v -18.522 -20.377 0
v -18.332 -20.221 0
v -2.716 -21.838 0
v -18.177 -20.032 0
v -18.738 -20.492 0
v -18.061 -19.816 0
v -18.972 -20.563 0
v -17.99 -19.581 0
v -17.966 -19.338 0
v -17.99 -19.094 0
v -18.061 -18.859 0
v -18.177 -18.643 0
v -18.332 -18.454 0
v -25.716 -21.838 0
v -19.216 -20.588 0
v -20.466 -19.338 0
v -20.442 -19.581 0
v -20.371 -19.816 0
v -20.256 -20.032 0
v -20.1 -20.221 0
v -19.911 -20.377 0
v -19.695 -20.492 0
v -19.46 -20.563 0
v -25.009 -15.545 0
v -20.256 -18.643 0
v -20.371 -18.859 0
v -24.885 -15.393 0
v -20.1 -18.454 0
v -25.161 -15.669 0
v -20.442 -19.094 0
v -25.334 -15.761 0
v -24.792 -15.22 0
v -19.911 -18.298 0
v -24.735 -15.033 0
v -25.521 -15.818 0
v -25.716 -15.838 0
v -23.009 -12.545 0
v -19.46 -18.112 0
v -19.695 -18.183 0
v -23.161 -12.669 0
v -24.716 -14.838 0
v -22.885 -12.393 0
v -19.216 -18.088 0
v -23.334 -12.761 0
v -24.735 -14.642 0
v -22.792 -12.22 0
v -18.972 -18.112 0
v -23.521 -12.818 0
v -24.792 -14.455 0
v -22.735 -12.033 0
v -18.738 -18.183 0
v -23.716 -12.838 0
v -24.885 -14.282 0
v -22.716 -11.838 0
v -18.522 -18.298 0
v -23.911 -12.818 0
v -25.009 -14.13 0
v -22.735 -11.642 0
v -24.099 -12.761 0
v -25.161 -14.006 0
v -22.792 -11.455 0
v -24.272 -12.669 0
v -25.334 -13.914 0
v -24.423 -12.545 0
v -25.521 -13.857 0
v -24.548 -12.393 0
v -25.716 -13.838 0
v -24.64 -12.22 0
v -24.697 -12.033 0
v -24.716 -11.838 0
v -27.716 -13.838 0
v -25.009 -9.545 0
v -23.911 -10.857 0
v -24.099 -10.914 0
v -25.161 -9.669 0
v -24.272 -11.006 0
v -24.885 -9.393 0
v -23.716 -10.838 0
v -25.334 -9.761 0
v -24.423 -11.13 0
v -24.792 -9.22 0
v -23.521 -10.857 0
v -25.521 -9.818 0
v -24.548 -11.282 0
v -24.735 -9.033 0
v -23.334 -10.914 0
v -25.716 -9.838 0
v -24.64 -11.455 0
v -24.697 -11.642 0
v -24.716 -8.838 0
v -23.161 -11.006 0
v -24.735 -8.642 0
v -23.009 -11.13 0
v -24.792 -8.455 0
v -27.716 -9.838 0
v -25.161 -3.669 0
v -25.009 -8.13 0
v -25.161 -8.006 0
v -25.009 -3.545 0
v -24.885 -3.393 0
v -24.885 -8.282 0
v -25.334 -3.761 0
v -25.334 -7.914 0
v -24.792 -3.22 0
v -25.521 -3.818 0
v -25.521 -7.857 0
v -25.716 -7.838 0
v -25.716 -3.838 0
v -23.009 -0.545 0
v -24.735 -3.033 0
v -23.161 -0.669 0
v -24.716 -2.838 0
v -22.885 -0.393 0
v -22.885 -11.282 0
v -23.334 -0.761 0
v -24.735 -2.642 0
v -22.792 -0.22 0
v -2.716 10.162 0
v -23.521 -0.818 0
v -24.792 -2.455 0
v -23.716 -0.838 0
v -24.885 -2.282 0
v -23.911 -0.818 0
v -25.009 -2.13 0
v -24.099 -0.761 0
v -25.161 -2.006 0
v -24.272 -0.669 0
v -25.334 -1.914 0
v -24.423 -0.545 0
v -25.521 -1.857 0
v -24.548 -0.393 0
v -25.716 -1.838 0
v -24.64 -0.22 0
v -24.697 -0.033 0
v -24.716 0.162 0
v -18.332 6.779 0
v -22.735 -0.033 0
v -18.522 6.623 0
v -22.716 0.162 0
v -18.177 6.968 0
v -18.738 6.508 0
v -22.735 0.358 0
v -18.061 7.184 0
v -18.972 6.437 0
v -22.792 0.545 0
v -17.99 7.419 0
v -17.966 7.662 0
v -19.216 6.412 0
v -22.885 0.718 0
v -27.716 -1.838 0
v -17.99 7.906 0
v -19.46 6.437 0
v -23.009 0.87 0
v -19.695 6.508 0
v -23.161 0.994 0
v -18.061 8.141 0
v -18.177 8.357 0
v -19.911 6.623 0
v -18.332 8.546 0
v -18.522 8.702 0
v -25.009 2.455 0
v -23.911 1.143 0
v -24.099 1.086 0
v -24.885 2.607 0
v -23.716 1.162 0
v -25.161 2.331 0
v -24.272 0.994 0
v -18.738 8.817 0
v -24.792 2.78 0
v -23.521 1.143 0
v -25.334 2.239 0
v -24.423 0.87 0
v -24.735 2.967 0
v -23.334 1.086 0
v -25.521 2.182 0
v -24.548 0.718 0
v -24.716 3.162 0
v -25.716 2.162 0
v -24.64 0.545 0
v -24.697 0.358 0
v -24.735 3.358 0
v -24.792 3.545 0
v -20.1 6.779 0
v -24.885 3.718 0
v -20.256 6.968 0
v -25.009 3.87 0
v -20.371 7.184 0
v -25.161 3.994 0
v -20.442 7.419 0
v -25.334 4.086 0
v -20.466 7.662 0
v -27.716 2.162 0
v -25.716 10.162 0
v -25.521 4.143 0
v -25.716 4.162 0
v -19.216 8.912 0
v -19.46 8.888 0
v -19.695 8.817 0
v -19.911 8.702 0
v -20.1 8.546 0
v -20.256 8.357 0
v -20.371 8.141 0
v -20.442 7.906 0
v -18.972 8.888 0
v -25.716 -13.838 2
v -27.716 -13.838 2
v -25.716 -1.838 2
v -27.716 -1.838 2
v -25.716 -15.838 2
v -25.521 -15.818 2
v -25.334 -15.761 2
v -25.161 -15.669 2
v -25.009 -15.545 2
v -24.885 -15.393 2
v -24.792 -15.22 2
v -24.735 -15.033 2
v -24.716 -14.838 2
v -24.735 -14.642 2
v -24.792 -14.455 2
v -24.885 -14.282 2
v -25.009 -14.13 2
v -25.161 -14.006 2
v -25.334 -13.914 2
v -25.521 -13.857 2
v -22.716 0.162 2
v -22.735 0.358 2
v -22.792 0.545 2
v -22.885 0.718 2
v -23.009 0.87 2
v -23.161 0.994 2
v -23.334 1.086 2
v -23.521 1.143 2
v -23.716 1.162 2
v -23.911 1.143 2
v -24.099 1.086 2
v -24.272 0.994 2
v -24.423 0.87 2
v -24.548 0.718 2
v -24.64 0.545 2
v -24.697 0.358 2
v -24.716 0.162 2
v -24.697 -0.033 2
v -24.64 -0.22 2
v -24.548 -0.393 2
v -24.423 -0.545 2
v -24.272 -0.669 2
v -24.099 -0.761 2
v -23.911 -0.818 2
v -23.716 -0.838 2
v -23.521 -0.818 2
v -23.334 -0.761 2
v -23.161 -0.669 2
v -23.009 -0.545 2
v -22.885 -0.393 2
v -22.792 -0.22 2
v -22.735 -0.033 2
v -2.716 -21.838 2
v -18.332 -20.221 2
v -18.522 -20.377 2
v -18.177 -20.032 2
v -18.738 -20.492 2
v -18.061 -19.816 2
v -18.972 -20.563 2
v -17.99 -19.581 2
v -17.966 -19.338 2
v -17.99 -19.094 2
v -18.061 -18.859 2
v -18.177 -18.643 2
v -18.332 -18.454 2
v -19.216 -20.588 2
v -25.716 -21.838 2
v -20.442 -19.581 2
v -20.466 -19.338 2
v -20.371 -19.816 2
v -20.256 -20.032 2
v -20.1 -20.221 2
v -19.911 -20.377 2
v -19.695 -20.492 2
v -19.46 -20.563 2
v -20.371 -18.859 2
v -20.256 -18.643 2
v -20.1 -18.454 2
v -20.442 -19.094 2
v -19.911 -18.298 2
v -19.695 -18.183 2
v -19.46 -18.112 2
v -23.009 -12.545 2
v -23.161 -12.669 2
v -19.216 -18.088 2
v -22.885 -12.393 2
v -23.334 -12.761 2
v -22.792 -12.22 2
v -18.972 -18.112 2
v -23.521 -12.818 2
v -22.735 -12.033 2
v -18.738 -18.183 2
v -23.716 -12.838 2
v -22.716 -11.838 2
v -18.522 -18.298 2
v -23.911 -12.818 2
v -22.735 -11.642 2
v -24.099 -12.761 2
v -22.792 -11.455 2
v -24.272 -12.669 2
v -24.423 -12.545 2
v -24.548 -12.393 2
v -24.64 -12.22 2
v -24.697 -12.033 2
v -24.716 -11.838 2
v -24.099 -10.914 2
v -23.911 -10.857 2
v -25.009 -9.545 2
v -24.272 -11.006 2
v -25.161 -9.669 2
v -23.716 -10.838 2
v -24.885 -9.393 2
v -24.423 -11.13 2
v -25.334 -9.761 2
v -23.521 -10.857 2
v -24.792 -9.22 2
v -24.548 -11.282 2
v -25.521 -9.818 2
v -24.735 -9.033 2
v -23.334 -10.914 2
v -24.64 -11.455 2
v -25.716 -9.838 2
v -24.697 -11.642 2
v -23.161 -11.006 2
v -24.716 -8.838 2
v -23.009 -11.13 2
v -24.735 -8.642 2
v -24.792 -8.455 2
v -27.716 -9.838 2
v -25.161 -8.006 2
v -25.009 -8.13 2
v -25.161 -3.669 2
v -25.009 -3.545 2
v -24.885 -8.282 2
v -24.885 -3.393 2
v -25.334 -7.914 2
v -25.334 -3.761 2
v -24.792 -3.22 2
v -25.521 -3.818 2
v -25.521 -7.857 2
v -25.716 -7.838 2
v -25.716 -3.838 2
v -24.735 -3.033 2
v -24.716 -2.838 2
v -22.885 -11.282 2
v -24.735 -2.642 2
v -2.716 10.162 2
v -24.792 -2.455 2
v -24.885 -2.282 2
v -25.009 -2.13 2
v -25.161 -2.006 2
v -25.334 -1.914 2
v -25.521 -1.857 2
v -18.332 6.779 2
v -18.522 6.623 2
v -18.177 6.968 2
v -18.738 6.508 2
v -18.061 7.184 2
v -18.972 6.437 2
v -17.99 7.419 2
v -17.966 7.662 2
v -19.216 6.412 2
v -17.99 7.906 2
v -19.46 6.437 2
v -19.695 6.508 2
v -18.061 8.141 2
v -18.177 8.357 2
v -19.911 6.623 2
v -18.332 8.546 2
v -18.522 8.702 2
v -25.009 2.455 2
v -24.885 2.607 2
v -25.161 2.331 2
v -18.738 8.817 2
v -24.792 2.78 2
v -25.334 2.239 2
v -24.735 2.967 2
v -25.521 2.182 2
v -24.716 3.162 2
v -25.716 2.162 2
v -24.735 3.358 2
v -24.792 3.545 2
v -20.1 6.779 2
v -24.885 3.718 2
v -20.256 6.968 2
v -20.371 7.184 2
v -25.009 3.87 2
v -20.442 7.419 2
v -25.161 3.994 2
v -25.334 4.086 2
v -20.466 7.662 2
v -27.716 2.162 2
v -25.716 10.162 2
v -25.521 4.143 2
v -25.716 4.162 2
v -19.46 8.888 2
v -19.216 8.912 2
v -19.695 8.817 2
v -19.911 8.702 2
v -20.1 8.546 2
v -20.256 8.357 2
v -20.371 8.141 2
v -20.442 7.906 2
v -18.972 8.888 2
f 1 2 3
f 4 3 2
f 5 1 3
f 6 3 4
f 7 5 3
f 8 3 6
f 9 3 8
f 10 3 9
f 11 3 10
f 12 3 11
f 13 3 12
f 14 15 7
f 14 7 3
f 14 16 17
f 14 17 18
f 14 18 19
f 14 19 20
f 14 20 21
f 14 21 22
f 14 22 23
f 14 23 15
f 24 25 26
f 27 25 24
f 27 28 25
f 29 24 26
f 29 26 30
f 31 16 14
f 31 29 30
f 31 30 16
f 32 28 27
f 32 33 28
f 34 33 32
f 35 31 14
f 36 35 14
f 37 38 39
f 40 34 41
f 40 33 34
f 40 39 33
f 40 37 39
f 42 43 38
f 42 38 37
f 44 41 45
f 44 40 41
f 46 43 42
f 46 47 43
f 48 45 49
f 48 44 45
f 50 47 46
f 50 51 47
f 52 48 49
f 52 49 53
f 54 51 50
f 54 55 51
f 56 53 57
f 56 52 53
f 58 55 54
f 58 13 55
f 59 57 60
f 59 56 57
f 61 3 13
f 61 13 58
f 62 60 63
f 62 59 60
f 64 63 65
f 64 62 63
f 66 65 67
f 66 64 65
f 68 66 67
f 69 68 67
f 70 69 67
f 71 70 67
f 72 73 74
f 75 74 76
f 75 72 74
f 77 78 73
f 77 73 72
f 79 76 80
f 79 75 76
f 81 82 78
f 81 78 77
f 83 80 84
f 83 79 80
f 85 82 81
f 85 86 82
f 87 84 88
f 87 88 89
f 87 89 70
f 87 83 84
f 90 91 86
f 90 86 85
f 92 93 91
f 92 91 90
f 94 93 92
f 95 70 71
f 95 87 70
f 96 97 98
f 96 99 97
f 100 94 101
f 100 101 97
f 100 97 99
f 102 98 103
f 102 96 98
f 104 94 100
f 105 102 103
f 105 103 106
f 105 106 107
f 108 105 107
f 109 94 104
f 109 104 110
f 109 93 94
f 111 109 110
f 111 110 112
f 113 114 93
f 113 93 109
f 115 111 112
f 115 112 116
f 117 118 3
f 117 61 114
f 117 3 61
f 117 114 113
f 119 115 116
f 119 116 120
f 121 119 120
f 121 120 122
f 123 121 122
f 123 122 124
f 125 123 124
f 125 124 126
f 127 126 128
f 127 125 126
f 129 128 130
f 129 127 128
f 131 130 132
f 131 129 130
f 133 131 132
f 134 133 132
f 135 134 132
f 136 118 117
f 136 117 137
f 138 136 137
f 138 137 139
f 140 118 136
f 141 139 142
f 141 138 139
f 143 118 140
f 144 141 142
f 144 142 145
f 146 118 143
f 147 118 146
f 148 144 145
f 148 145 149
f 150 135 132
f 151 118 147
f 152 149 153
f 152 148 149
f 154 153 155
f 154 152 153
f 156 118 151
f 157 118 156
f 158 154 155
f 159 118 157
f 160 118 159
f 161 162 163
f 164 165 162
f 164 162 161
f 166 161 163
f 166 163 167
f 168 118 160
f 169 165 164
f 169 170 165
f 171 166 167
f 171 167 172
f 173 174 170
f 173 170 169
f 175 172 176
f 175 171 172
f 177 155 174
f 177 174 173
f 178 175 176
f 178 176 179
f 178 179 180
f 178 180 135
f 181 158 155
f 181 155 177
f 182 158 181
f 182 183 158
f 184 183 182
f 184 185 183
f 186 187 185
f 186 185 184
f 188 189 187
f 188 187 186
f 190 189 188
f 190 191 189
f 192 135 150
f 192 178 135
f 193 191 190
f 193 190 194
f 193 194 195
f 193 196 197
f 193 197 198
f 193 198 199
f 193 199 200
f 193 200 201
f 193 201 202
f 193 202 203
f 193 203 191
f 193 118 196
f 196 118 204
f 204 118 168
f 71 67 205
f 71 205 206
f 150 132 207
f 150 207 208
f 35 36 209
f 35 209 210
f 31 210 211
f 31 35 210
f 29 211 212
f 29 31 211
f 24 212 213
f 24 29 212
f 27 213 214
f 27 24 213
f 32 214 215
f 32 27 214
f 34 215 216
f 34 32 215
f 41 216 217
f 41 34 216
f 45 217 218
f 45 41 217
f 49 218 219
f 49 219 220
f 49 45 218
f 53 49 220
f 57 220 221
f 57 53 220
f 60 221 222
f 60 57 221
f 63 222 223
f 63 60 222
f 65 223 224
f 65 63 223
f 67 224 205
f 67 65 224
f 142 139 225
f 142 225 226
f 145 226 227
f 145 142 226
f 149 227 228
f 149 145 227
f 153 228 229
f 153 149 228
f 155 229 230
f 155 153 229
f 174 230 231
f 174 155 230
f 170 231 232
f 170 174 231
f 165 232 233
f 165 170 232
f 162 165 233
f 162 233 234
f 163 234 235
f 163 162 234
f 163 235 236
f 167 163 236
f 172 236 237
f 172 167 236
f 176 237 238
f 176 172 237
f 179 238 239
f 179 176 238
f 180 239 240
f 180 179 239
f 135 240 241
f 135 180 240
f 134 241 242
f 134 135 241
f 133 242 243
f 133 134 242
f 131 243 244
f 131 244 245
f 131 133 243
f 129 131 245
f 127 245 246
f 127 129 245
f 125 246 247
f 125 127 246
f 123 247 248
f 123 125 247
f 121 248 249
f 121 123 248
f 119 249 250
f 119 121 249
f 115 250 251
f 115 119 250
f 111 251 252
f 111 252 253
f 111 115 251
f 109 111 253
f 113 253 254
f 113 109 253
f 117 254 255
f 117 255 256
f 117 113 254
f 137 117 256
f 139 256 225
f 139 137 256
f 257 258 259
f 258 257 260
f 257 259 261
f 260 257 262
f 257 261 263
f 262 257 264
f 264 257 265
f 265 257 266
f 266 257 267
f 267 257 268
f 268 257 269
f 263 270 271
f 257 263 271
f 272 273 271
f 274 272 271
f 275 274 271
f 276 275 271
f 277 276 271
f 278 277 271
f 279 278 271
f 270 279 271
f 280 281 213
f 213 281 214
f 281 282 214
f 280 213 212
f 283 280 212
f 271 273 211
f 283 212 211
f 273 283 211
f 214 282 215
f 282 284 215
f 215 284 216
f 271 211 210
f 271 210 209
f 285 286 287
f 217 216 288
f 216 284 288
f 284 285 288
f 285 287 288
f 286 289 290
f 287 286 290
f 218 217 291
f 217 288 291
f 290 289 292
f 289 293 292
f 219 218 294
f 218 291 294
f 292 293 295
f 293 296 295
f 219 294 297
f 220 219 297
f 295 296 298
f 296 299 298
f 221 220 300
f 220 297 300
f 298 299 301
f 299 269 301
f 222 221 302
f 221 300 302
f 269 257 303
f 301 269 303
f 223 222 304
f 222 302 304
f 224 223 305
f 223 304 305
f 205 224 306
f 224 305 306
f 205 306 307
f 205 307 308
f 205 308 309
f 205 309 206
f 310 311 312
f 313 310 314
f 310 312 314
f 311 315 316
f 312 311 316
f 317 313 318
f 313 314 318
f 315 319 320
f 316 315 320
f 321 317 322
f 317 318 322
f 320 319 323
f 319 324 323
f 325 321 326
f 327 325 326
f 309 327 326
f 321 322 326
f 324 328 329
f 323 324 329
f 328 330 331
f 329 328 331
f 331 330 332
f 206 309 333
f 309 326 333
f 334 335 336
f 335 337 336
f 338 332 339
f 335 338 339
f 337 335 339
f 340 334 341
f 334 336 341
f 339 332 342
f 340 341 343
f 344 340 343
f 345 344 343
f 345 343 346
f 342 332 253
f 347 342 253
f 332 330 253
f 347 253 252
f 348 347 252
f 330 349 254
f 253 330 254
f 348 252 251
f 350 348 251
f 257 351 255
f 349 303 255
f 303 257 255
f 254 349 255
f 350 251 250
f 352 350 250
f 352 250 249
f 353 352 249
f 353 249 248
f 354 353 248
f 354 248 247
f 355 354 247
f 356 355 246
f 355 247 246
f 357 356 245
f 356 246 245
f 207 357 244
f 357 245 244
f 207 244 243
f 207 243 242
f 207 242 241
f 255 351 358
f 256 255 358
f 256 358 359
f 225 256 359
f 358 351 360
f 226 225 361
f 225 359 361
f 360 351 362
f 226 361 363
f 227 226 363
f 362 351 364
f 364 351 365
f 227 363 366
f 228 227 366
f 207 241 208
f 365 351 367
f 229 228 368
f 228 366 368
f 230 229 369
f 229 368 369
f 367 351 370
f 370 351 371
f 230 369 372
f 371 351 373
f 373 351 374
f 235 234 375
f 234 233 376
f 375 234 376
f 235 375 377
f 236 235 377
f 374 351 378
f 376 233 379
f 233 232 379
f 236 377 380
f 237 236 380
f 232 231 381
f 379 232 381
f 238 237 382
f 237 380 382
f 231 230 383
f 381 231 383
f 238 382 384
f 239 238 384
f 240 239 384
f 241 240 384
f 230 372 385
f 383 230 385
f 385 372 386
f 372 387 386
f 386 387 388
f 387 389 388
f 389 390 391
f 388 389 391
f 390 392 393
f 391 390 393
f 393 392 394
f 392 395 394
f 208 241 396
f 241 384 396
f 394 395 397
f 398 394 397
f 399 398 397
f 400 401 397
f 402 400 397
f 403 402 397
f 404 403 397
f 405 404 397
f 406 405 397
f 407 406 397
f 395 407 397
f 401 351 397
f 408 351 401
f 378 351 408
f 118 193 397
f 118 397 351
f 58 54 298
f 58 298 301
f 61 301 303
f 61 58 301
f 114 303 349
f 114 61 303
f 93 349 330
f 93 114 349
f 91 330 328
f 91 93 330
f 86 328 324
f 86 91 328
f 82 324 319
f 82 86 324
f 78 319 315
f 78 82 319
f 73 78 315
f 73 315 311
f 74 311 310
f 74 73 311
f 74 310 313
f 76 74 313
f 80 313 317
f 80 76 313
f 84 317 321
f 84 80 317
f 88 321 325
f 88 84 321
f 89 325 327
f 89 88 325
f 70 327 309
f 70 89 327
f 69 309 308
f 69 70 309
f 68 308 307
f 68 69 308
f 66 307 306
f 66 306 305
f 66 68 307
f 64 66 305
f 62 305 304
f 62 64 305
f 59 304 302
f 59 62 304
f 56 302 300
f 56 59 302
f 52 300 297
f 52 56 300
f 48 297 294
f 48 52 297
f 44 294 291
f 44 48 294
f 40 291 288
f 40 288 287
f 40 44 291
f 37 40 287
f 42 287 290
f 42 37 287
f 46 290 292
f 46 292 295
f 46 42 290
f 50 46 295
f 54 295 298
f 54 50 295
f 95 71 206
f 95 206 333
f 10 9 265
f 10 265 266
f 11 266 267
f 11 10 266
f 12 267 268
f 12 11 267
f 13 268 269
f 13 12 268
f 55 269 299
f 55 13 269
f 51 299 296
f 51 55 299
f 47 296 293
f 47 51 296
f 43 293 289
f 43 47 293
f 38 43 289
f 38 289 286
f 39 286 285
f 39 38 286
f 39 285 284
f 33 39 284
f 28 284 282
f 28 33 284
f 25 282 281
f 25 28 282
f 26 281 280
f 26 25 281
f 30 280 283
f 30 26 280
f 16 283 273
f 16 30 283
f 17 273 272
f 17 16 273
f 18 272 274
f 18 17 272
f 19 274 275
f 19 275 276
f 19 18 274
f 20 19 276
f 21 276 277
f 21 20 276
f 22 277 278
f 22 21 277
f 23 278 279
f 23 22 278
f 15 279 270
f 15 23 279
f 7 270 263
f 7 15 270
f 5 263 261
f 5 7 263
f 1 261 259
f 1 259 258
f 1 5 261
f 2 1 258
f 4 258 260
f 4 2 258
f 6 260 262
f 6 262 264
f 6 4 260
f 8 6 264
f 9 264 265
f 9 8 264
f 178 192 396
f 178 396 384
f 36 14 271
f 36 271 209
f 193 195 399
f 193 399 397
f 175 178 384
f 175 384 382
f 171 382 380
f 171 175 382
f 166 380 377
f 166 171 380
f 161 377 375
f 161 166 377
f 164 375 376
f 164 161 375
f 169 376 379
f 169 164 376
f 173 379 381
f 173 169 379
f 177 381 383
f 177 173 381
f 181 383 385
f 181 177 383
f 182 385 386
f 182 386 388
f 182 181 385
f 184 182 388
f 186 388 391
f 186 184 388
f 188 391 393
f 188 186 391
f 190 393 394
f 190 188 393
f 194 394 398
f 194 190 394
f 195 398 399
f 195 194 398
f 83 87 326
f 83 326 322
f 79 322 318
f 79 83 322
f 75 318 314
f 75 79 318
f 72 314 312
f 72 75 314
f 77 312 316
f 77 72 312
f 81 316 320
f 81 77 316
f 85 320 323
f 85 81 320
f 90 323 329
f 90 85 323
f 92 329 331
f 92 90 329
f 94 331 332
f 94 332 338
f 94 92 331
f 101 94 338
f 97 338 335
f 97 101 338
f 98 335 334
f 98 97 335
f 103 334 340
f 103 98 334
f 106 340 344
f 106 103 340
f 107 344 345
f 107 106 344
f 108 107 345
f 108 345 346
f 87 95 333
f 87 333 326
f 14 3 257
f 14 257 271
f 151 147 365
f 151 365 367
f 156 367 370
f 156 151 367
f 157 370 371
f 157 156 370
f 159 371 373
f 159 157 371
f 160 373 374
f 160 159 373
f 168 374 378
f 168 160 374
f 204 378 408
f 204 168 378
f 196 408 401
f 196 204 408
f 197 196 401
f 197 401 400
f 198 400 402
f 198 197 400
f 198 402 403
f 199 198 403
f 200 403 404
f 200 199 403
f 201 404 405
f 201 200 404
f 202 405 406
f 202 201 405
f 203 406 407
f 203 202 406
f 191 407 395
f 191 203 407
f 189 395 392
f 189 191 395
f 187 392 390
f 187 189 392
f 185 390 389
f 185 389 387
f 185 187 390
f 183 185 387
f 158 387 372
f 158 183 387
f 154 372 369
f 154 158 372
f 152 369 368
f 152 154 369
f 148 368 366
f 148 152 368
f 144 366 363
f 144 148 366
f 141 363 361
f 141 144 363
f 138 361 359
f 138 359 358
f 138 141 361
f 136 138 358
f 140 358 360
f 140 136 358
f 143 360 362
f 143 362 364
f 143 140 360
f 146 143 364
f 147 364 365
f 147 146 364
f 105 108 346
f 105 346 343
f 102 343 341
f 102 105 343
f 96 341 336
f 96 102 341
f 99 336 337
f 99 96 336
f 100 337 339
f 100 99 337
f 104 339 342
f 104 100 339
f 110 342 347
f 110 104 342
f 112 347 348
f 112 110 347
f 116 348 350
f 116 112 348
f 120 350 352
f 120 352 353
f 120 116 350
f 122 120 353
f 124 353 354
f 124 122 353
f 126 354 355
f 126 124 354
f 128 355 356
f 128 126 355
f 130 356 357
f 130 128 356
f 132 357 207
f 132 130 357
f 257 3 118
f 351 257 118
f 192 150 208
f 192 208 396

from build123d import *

# Parameters (mm, degrees)
SKETCH_1_R          = 1.25
SKETCH_1_R_2        = 1
EXTRUDE_1_DEPTH     = 2
SKETCH_4_W          = 15.5
SKETCH_4_H          = 22
CUT_EXTRUDE_1_DEPTH = 2
FILLET_2_R          = 2.5
FILLET_3_R          = 5
SKETCH_6_W          = 16
SKETCH_6_H          = 32
CUT_EXTRUDE_3_DEPTH = 10


with BuildPart() as part:
    # 草圖1 → 填料-伸長1 (new body)
    with BuildSketch(Plane.XY):
        with BuildLine():
            Line((-17.216213198, 10.1625), (13.283786802, 10.1625))
            Line((13.283786802, 10.1625), (13.283786802, -21.8375))
            Line((13.283786802, -21.8375), (-17.216213198, -21.8375))
            Line((-17.216213198, -21.8375), (-19.716213198, -21.8375))
            Line((-19.716213198, -21.8375), (-25.716213198, -21.8375))
            Line((-25.716213198, -21.8375), (-25.716213198, -15.8375))
            ThreePointArc((-25.716213198, -15.8375), (-24.716213198, -14.8375), (-25.716213198, -13.8375))
            Line((-25.716213198, -13.8375), (-27.716213198, -13.8375))
            Line((-27.716213198, -13.8375), (-27.716213198, -9.8375))
            Line((-27.716213198, -9.8375), (-25.716213198, -9.8375))
            ThreePointArc((-25.716213198, -9.8375), (-24.716213198, -8.8375), (-25.716213198, -7.8375))
            Line((-25.716213198, -7.8375), (-25.716213198, -3.8375))
            ThreePointArc((-25.716213198, -3.8375), (-24.716213198, -2.8375), (-25.716213198, -1.8375))
            Line((-25.716213198, -1.8375), (-27.716213198, -1.8375))
            Line((-27.716213198, -1.8375), (-27.716213198, 2.1625))
            Line((-27.716213198, 2.1625), (-25.716213198, 2.1625))
            ThreePointArc((-25.716213198, 2.1625), (-24.716213198, 3.1625), (-25.716213198, 4.1625))
            Line((-25.716213198, 4.1625), (-25.716213198, 10.1625))
            Line((-25.716213198, 10.1625), (-21.716213198, 10.1625))
            Line((-21.716213198, 10.1625), (-17.216213198, 10.1625))
        make_face()
        with Locations((-19.216213198, 7.6625)):
            Circle(SKETCH_1_R, mode=Mode.SUBTRACT)
        with Locations((-19.216213198, -19.3375)):
            Circle(SKETCH_1_R, mode=Mode.SUBTRACT)
        with Locations((10.783786802, -19.3375)):
            Circle(SKETCH_1_R, mode=Mode.SUBTRACT)
        with Locations((10.783786802, 7.6625)):
            Circle(SKETCH_1_R, mode=Mode.SUBTRACT)
        with Locations((-23.716213198, -11.8375)):
            Circle(SKETCH_1_R_2, mode=Mode.SUBTRACT)
        with Locations((-23.716213198, 0.1625)):
            Circle(SKETCH_1_R_2, mode=Mode.SUBTRACT)
    extrude(amount=EXTRUDE_1_DEPTH)

    # 草圖4 → 除料-伸長1 (cut)
    with BuildSketch(Plane(origin=(0, 0, 0), x_dir=(-1, 0, 0), z_dir=(0, 0, -1))):
        with Locations((-5.533786802, -5.8375)):
            Rectangle(SKETCH_4_W, SKETCH_4_H)
    extrude(amount=-CUT_EXTRUDE_1_DEPTH, mode=Mode.SUBTRACT)

    # 圓角2
    fillet_2_edges = [part.edges().sort_by_distance(p)[0] for p in [
        (13.283786802, -16.8375, 1),
        (13.283786802, 5.1625, 1),
    ]]
    fillet(fillet_2_edges, radius=FILLET_2_R)

    # 圓角3
    fillet_3_edges = [part.edges().sort_by_distance(p)[0] for p in [
        (-2.216213198, 5.1625, 1),
        (-2.216213198, -16.8375, 1),
    ]]
    fillet(fillet_3_edges, radius=FILLET_3_R)

    # 草圖6 → 除料-伸長3 (cut)
    with BuildSketch(Plane(origin=(0, 0, 0), x_dir=(-1, 0, 0), z_dir=(0, 0, -1))):
        with Locations((-5.283786802, -5.8375)):
            Rectangle(SKETCH_6_W, SKETCH_6_H)
    extrude(amount=-CUT_EXTRUDE_3_DEPTH, mode=Mode.SUBTRACT)


solid = part.part
